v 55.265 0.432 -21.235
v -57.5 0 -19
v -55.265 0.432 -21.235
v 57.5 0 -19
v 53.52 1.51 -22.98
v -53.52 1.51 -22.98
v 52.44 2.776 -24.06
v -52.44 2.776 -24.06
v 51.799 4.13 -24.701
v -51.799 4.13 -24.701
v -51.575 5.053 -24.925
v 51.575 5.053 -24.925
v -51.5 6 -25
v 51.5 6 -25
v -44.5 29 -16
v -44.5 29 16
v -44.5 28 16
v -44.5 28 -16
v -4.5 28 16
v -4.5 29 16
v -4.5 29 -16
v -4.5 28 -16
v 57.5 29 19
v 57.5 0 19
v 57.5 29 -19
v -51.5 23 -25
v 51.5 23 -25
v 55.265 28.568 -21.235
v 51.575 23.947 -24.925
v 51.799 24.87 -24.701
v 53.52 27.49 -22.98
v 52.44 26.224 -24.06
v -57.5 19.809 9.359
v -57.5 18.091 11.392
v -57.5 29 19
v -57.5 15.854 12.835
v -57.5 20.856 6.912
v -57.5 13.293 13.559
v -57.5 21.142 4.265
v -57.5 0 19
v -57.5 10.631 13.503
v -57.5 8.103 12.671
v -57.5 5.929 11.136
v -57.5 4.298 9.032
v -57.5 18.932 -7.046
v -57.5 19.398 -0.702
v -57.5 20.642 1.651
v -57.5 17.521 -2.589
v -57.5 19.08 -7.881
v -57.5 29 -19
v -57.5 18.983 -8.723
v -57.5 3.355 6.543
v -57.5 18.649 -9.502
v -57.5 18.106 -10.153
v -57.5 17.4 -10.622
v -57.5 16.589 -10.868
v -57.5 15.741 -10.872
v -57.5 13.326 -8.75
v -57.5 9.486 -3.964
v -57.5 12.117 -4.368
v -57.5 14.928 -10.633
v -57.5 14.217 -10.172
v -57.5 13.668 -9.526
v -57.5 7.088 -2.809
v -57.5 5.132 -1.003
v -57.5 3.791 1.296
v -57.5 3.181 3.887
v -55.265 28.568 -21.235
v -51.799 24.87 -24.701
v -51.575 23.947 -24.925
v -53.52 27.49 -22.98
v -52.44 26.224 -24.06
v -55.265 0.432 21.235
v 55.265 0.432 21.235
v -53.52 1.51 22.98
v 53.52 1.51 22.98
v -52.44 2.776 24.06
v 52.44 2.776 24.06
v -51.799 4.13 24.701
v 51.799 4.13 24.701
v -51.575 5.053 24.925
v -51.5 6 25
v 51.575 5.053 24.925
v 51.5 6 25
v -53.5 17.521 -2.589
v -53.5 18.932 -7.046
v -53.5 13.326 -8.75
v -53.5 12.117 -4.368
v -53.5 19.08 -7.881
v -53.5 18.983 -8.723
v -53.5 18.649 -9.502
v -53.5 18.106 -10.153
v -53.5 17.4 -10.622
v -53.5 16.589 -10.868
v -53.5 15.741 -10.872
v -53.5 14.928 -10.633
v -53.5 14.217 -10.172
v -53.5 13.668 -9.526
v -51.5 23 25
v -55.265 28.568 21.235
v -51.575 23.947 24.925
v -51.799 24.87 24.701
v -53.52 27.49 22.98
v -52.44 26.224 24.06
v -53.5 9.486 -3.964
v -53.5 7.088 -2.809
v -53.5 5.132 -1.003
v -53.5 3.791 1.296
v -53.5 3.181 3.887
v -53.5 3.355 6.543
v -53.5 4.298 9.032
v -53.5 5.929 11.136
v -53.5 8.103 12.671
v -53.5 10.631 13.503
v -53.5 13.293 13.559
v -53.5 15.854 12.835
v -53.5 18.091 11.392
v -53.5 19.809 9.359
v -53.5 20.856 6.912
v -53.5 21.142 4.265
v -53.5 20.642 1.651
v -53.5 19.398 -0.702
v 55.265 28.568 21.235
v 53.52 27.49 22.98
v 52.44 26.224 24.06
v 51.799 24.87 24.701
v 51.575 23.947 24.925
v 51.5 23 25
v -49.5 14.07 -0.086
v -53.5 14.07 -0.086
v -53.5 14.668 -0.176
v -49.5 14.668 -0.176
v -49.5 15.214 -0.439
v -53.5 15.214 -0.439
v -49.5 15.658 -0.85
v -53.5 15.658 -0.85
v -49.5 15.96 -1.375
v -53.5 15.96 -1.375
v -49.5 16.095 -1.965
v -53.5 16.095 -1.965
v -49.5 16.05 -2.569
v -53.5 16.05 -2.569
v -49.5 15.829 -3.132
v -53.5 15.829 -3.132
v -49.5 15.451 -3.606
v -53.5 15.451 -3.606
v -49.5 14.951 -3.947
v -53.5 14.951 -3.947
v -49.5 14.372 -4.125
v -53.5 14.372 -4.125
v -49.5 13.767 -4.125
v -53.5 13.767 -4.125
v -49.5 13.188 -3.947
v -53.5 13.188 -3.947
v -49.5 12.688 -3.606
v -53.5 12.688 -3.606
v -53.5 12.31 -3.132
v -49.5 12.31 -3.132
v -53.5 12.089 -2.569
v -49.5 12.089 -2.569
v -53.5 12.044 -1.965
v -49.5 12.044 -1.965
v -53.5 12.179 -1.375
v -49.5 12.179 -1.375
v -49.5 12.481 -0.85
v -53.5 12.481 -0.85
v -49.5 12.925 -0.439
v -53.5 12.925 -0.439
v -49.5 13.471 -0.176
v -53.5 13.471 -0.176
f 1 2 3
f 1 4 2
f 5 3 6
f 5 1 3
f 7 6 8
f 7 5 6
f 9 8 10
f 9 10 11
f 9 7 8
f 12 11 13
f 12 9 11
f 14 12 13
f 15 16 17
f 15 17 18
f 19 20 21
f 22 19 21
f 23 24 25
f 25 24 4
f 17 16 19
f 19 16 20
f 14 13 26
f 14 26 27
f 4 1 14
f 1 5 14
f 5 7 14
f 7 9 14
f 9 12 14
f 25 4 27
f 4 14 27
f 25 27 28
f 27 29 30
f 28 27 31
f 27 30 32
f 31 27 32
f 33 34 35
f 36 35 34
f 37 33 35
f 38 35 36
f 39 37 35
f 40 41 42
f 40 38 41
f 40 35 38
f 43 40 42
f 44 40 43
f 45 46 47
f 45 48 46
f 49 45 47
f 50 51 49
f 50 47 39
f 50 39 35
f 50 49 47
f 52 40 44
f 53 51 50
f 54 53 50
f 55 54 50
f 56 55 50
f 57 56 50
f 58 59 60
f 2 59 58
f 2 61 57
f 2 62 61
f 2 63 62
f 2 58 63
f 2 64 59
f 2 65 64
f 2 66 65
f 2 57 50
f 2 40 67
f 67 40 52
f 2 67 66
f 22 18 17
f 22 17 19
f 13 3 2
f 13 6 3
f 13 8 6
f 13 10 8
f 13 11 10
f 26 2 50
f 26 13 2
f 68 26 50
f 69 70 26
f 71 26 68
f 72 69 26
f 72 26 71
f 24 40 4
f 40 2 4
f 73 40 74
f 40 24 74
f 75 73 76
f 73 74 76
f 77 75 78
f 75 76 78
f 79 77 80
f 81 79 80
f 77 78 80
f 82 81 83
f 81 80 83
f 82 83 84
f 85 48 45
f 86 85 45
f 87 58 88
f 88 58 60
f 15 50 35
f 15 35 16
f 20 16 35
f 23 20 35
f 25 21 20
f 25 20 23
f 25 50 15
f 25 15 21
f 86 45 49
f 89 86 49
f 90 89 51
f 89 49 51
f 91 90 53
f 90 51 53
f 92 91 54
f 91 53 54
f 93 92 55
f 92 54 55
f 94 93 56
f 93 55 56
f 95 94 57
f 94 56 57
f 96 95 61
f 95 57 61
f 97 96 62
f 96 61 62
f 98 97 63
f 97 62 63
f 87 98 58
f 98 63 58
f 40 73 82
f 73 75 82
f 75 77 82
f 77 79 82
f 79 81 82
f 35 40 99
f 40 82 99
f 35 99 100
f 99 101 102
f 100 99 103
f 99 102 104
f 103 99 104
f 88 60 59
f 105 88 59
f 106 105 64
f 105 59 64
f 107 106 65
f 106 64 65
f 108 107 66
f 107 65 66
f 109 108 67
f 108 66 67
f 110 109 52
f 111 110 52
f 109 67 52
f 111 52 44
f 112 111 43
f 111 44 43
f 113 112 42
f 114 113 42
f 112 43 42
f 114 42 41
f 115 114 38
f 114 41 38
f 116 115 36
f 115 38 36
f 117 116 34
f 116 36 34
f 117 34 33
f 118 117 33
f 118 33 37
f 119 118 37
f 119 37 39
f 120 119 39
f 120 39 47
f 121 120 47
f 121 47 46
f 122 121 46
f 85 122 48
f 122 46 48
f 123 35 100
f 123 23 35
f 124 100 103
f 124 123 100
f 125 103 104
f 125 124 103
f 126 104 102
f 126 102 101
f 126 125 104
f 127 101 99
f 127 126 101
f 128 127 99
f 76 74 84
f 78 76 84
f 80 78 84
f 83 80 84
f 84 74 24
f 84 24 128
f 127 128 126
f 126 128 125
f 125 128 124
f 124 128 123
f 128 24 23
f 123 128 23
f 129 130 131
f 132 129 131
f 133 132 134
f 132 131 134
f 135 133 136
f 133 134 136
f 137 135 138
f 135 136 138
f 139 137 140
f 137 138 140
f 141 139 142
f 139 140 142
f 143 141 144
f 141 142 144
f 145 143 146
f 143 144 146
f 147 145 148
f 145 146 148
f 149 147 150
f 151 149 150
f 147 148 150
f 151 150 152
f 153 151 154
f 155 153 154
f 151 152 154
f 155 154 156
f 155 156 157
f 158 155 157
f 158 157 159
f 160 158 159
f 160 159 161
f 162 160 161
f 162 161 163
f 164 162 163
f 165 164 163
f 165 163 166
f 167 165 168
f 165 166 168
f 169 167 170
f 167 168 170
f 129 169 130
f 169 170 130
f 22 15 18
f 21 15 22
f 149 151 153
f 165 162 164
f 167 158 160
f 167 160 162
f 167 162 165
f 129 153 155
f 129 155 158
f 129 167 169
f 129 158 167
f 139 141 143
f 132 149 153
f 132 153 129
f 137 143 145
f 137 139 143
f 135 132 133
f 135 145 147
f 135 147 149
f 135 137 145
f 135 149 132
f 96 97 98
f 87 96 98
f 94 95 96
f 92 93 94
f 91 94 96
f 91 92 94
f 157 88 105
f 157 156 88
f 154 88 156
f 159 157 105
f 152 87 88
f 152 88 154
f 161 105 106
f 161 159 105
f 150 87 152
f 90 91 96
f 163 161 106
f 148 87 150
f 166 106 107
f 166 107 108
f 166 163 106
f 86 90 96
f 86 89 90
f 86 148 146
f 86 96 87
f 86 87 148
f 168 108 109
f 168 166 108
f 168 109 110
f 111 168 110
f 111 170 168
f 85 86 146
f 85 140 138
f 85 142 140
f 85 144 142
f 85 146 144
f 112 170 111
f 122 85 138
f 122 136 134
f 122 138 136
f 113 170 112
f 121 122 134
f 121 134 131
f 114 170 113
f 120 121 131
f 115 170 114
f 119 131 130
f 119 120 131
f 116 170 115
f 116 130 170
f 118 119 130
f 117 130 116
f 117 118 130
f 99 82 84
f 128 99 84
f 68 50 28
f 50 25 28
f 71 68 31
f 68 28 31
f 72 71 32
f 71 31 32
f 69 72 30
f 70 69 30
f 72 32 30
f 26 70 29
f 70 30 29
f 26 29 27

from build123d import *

# Parameters (mm, degrees)
SKETCH1_W           = 115
SKETCH1_H           = 50
BOSS_EXTRUDE1_DEPTH = 29
CHAMFER1_SIZE       = 6
FILLET1_R           = 6
SKETCH2_W           = 40
SKETCH2_H           = 32
CUT_EXTRUDE1_DEPTH  = 1
CUT_EXTRUDE2_DEPTH  = 4
SKETCH4_R           = 2.031264326
CUT_EXTRUDE3_DEPTH  = 4


with BuildPart() as part:
    # Sketch1 → Boss-Extrude1 (new body)
    with BuildSketch(Plane(origin=(0, 0, 0), x_dir=(1, 0, 0), z_dir=(0, 1, 0))):
        Rectangle(SKETCH1_W, SKETCH1_H)
    extrude(amount=BOSS_EXTRUDE1_DEPTH)

    # Chamfer1
    chamfer1_edges = [part.edges().sort_by_distance(p)[0] for p in [
        (-57.5, 14.5, -25),
        (57.5, 14.5, -25),
        (57.5, 14.5, 25),
        (-57.5, 14.5, 25),
    ]]
    chamfer(chamfer1_edges, length=CHAMFER1_SIZE)

    # Fillet1
    fillet1_edges = [part.edges().sort_by_distance(p)[0] for p in [
        (0, 0, 25),
        (0, 0, -25),
        (0, 29, -25),
        (0, 29, 25),
    ]]
    fillet(fillet1_edges, radius=FILLET1_R)

    # Sketch2 → Cut-Extrude1 (cut)
    with BuildSketch(Plane(origin=(0, 29, 0), x_dir=(1, 0, 0), z_dir=(0, 1, 0))):
        with Locations((-24.5, 0)):
            Rectangle(SKETCH2_W, SKETCH2_H)
    extrude(amount=-CUT_EXTRUDE1_DEPTH, mode=Mode.SUBTRACT)

    # Sketch3 → Cut-Extrude2 (cut)
    with BuildSketch(Plane.ZY.offset(57.5)):
        with BuildLine():
            Line((-8.750173975, 13.326246728), (-4.367676958, 12.116929263))
            ThreePointArc((-4.367676958, 12.116929263), (13.18123027, 9.336320138), (-2.589295615, 17.520844884))
            Line((-2.589295615, 17.520844884), (-7.046459278, 18.931908537))
            ThreePointArc((-7.046459278, 18.931908537), (-10.774449394, 17.003213431), (-8.750173975, 13.326246728))
        make_face()
    extrude(amount=-CUT_EXTRUDE2_DEPTH, mode=Mode.SUBTRACT)

    # Sketch4 → Cut-Extrude3 (cut)
    with BuildSketch(Plane.ZY.offset(53.5)):
        with Locations((-2.116830312, 14.069543065)):
            Circle(SKETCH4_R)
    extrude(amount=-CUT_EXTRUDE3_DEPTH, mode=Mode.SUBTRACT)


solid = part.part
